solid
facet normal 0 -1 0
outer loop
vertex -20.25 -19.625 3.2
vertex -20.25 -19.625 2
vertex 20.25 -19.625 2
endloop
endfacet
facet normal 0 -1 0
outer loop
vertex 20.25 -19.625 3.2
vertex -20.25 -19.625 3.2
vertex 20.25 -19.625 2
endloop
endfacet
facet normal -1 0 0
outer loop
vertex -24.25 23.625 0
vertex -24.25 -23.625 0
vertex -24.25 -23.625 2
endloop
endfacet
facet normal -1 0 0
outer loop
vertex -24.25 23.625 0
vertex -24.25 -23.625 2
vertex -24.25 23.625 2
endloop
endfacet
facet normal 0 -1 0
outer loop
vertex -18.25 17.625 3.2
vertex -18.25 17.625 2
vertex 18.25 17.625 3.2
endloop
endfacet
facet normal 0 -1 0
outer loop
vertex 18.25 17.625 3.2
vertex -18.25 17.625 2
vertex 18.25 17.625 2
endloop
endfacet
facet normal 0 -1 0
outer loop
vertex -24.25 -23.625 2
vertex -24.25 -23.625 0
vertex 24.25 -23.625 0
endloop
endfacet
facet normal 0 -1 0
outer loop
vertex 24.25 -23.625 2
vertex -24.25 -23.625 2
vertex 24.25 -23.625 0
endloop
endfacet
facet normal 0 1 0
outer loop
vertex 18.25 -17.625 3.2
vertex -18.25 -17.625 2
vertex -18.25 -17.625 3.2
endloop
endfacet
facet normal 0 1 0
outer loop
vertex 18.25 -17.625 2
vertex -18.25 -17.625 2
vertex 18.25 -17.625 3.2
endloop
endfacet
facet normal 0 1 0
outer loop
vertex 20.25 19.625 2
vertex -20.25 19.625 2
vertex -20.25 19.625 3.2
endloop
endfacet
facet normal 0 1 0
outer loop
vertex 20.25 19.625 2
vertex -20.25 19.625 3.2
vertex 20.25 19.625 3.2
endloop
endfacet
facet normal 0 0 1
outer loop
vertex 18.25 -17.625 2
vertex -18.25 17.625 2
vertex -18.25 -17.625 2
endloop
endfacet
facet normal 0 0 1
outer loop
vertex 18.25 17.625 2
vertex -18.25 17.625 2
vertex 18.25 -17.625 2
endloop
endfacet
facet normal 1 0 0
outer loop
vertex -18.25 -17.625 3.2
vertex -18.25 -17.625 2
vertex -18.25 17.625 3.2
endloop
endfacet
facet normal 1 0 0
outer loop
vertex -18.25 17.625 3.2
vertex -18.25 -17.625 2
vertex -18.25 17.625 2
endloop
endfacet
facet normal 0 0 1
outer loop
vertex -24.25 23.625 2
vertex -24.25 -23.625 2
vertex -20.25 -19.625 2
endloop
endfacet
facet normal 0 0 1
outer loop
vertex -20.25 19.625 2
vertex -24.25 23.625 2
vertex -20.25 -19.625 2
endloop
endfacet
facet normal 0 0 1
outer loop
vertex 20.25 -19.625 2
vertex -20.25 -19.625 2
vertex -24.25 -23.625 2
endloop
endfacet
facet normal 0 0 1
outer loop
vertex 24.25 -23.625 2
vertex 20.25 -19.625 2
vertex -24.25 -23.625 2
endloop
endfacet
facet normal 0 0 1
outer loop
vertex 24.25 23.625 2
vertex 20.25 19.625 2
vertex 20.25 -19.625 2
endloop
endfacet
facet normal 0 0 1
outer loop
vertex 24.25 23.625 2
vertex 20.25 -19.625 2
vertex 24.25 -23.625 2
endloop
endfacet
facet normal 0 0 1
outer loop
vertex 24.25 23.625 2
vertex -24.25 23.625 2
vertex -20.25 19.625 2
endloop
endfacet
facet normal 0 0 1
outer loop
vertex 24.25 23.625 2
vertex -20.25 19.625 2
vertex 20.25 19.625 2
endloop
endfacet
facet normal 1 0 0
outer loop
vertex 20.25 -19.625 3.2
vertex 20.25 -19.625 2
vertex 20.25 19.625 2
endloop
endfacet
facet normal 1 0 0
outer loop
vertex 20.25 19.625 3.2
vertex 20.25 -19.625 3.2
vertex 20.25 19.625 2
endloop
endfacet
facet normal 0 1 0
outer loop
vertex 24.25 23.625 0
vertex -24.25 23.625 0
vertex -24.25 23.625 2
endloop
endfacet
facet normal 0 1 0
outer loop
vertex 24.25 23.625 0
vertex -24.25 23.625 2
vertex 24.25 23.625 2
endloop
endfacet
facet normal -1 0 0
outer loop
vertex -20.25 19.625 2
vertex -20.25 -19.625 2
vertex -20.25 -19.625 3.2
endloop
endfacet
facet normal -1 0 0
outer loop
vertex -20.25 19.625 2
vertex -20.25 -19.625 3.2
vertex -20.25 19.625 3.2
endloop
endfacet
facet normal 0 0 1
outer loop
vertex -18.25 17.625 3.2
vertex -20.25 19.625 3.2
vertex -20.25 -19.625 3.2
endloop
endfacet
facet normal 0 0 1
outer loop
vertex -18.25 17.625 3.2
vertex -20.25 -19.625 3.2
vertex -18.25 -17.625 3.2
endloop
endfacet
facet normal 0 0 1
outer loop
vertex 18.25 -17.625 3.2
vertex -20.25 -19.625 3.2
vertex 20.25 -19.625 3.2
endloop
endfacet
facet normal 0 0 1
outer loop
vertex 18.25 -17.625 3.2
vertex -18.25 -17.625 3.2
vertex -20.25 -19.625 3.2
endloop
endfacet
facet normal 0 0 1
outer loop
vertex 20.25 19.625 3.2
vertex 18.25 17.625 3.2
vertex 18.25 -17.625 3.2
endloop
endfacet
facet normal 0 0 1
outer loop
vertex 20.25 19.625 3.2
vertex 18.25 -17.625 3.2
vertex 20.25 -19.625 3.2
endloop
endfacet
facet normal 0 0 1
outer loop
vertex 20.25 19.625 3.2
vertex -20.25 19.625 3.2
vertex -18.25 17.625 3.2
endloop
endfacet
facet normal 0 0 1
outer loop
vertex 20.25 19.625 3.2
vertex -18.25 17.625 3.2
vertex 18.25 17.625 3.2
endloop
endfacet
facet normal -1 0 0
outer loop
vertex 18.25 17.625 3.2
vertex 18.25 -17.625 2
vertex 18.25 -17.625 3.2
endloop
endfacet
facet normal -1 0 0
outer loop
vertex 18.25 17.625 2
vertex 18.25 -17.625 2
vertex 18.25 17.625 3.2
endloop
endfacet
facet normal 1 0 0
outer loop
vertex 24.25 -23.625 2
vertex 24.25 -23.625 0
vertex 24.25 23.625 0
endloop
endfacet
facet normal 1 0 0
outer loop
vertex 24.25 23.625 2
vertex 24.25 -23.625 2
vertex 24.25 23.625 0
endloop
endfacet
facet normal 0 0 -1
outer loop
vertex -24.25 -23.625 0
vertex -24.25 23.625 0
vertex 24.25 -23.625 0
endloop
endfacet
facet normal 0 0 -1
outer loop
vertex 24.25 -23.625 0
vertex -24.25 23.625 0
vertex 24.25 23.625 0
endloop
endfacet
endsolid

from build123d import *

# Parameters (mm, degrees)
F0_W     = 48.5
F0_H     = 47.25
F0_W_2   = 40.5
F0_H_2   = 39.25
F0_W_3   = 36.5
F0_H_3   = 35.25
F1_DEPTH = 2
F2_DEPTH = 3.2


with BuildPart() as f1:
    # F0 (on Top) → F1 (new body)
    with BuildSketch(Plane.XY):
        Rectangle(F0_W, F0_H)
        Rectangle(F0_W_2, F0_H_2, mode=Mode.SUBTRACT)
        Rectangle(F0_W_2, F0_H_2)
        Rectangle(F0_W_3, F0_H_3, mode=Mode.SUBTRACT)
        Rectangle(F0_W_3, F0_H_3)
    extrude(amount=F1_DEPTH)

    # F0 (on Top) → F2 (join)
    with BuildSketch(Plane.XY):
        Rectangle(F0_W_2, F0_H_2)
        Rectangle(F0_W_3, F0_H_3, mode=Mode.SUBTRACT)
    extrude(amount=F2_DEPTH)


solid = f1.part
